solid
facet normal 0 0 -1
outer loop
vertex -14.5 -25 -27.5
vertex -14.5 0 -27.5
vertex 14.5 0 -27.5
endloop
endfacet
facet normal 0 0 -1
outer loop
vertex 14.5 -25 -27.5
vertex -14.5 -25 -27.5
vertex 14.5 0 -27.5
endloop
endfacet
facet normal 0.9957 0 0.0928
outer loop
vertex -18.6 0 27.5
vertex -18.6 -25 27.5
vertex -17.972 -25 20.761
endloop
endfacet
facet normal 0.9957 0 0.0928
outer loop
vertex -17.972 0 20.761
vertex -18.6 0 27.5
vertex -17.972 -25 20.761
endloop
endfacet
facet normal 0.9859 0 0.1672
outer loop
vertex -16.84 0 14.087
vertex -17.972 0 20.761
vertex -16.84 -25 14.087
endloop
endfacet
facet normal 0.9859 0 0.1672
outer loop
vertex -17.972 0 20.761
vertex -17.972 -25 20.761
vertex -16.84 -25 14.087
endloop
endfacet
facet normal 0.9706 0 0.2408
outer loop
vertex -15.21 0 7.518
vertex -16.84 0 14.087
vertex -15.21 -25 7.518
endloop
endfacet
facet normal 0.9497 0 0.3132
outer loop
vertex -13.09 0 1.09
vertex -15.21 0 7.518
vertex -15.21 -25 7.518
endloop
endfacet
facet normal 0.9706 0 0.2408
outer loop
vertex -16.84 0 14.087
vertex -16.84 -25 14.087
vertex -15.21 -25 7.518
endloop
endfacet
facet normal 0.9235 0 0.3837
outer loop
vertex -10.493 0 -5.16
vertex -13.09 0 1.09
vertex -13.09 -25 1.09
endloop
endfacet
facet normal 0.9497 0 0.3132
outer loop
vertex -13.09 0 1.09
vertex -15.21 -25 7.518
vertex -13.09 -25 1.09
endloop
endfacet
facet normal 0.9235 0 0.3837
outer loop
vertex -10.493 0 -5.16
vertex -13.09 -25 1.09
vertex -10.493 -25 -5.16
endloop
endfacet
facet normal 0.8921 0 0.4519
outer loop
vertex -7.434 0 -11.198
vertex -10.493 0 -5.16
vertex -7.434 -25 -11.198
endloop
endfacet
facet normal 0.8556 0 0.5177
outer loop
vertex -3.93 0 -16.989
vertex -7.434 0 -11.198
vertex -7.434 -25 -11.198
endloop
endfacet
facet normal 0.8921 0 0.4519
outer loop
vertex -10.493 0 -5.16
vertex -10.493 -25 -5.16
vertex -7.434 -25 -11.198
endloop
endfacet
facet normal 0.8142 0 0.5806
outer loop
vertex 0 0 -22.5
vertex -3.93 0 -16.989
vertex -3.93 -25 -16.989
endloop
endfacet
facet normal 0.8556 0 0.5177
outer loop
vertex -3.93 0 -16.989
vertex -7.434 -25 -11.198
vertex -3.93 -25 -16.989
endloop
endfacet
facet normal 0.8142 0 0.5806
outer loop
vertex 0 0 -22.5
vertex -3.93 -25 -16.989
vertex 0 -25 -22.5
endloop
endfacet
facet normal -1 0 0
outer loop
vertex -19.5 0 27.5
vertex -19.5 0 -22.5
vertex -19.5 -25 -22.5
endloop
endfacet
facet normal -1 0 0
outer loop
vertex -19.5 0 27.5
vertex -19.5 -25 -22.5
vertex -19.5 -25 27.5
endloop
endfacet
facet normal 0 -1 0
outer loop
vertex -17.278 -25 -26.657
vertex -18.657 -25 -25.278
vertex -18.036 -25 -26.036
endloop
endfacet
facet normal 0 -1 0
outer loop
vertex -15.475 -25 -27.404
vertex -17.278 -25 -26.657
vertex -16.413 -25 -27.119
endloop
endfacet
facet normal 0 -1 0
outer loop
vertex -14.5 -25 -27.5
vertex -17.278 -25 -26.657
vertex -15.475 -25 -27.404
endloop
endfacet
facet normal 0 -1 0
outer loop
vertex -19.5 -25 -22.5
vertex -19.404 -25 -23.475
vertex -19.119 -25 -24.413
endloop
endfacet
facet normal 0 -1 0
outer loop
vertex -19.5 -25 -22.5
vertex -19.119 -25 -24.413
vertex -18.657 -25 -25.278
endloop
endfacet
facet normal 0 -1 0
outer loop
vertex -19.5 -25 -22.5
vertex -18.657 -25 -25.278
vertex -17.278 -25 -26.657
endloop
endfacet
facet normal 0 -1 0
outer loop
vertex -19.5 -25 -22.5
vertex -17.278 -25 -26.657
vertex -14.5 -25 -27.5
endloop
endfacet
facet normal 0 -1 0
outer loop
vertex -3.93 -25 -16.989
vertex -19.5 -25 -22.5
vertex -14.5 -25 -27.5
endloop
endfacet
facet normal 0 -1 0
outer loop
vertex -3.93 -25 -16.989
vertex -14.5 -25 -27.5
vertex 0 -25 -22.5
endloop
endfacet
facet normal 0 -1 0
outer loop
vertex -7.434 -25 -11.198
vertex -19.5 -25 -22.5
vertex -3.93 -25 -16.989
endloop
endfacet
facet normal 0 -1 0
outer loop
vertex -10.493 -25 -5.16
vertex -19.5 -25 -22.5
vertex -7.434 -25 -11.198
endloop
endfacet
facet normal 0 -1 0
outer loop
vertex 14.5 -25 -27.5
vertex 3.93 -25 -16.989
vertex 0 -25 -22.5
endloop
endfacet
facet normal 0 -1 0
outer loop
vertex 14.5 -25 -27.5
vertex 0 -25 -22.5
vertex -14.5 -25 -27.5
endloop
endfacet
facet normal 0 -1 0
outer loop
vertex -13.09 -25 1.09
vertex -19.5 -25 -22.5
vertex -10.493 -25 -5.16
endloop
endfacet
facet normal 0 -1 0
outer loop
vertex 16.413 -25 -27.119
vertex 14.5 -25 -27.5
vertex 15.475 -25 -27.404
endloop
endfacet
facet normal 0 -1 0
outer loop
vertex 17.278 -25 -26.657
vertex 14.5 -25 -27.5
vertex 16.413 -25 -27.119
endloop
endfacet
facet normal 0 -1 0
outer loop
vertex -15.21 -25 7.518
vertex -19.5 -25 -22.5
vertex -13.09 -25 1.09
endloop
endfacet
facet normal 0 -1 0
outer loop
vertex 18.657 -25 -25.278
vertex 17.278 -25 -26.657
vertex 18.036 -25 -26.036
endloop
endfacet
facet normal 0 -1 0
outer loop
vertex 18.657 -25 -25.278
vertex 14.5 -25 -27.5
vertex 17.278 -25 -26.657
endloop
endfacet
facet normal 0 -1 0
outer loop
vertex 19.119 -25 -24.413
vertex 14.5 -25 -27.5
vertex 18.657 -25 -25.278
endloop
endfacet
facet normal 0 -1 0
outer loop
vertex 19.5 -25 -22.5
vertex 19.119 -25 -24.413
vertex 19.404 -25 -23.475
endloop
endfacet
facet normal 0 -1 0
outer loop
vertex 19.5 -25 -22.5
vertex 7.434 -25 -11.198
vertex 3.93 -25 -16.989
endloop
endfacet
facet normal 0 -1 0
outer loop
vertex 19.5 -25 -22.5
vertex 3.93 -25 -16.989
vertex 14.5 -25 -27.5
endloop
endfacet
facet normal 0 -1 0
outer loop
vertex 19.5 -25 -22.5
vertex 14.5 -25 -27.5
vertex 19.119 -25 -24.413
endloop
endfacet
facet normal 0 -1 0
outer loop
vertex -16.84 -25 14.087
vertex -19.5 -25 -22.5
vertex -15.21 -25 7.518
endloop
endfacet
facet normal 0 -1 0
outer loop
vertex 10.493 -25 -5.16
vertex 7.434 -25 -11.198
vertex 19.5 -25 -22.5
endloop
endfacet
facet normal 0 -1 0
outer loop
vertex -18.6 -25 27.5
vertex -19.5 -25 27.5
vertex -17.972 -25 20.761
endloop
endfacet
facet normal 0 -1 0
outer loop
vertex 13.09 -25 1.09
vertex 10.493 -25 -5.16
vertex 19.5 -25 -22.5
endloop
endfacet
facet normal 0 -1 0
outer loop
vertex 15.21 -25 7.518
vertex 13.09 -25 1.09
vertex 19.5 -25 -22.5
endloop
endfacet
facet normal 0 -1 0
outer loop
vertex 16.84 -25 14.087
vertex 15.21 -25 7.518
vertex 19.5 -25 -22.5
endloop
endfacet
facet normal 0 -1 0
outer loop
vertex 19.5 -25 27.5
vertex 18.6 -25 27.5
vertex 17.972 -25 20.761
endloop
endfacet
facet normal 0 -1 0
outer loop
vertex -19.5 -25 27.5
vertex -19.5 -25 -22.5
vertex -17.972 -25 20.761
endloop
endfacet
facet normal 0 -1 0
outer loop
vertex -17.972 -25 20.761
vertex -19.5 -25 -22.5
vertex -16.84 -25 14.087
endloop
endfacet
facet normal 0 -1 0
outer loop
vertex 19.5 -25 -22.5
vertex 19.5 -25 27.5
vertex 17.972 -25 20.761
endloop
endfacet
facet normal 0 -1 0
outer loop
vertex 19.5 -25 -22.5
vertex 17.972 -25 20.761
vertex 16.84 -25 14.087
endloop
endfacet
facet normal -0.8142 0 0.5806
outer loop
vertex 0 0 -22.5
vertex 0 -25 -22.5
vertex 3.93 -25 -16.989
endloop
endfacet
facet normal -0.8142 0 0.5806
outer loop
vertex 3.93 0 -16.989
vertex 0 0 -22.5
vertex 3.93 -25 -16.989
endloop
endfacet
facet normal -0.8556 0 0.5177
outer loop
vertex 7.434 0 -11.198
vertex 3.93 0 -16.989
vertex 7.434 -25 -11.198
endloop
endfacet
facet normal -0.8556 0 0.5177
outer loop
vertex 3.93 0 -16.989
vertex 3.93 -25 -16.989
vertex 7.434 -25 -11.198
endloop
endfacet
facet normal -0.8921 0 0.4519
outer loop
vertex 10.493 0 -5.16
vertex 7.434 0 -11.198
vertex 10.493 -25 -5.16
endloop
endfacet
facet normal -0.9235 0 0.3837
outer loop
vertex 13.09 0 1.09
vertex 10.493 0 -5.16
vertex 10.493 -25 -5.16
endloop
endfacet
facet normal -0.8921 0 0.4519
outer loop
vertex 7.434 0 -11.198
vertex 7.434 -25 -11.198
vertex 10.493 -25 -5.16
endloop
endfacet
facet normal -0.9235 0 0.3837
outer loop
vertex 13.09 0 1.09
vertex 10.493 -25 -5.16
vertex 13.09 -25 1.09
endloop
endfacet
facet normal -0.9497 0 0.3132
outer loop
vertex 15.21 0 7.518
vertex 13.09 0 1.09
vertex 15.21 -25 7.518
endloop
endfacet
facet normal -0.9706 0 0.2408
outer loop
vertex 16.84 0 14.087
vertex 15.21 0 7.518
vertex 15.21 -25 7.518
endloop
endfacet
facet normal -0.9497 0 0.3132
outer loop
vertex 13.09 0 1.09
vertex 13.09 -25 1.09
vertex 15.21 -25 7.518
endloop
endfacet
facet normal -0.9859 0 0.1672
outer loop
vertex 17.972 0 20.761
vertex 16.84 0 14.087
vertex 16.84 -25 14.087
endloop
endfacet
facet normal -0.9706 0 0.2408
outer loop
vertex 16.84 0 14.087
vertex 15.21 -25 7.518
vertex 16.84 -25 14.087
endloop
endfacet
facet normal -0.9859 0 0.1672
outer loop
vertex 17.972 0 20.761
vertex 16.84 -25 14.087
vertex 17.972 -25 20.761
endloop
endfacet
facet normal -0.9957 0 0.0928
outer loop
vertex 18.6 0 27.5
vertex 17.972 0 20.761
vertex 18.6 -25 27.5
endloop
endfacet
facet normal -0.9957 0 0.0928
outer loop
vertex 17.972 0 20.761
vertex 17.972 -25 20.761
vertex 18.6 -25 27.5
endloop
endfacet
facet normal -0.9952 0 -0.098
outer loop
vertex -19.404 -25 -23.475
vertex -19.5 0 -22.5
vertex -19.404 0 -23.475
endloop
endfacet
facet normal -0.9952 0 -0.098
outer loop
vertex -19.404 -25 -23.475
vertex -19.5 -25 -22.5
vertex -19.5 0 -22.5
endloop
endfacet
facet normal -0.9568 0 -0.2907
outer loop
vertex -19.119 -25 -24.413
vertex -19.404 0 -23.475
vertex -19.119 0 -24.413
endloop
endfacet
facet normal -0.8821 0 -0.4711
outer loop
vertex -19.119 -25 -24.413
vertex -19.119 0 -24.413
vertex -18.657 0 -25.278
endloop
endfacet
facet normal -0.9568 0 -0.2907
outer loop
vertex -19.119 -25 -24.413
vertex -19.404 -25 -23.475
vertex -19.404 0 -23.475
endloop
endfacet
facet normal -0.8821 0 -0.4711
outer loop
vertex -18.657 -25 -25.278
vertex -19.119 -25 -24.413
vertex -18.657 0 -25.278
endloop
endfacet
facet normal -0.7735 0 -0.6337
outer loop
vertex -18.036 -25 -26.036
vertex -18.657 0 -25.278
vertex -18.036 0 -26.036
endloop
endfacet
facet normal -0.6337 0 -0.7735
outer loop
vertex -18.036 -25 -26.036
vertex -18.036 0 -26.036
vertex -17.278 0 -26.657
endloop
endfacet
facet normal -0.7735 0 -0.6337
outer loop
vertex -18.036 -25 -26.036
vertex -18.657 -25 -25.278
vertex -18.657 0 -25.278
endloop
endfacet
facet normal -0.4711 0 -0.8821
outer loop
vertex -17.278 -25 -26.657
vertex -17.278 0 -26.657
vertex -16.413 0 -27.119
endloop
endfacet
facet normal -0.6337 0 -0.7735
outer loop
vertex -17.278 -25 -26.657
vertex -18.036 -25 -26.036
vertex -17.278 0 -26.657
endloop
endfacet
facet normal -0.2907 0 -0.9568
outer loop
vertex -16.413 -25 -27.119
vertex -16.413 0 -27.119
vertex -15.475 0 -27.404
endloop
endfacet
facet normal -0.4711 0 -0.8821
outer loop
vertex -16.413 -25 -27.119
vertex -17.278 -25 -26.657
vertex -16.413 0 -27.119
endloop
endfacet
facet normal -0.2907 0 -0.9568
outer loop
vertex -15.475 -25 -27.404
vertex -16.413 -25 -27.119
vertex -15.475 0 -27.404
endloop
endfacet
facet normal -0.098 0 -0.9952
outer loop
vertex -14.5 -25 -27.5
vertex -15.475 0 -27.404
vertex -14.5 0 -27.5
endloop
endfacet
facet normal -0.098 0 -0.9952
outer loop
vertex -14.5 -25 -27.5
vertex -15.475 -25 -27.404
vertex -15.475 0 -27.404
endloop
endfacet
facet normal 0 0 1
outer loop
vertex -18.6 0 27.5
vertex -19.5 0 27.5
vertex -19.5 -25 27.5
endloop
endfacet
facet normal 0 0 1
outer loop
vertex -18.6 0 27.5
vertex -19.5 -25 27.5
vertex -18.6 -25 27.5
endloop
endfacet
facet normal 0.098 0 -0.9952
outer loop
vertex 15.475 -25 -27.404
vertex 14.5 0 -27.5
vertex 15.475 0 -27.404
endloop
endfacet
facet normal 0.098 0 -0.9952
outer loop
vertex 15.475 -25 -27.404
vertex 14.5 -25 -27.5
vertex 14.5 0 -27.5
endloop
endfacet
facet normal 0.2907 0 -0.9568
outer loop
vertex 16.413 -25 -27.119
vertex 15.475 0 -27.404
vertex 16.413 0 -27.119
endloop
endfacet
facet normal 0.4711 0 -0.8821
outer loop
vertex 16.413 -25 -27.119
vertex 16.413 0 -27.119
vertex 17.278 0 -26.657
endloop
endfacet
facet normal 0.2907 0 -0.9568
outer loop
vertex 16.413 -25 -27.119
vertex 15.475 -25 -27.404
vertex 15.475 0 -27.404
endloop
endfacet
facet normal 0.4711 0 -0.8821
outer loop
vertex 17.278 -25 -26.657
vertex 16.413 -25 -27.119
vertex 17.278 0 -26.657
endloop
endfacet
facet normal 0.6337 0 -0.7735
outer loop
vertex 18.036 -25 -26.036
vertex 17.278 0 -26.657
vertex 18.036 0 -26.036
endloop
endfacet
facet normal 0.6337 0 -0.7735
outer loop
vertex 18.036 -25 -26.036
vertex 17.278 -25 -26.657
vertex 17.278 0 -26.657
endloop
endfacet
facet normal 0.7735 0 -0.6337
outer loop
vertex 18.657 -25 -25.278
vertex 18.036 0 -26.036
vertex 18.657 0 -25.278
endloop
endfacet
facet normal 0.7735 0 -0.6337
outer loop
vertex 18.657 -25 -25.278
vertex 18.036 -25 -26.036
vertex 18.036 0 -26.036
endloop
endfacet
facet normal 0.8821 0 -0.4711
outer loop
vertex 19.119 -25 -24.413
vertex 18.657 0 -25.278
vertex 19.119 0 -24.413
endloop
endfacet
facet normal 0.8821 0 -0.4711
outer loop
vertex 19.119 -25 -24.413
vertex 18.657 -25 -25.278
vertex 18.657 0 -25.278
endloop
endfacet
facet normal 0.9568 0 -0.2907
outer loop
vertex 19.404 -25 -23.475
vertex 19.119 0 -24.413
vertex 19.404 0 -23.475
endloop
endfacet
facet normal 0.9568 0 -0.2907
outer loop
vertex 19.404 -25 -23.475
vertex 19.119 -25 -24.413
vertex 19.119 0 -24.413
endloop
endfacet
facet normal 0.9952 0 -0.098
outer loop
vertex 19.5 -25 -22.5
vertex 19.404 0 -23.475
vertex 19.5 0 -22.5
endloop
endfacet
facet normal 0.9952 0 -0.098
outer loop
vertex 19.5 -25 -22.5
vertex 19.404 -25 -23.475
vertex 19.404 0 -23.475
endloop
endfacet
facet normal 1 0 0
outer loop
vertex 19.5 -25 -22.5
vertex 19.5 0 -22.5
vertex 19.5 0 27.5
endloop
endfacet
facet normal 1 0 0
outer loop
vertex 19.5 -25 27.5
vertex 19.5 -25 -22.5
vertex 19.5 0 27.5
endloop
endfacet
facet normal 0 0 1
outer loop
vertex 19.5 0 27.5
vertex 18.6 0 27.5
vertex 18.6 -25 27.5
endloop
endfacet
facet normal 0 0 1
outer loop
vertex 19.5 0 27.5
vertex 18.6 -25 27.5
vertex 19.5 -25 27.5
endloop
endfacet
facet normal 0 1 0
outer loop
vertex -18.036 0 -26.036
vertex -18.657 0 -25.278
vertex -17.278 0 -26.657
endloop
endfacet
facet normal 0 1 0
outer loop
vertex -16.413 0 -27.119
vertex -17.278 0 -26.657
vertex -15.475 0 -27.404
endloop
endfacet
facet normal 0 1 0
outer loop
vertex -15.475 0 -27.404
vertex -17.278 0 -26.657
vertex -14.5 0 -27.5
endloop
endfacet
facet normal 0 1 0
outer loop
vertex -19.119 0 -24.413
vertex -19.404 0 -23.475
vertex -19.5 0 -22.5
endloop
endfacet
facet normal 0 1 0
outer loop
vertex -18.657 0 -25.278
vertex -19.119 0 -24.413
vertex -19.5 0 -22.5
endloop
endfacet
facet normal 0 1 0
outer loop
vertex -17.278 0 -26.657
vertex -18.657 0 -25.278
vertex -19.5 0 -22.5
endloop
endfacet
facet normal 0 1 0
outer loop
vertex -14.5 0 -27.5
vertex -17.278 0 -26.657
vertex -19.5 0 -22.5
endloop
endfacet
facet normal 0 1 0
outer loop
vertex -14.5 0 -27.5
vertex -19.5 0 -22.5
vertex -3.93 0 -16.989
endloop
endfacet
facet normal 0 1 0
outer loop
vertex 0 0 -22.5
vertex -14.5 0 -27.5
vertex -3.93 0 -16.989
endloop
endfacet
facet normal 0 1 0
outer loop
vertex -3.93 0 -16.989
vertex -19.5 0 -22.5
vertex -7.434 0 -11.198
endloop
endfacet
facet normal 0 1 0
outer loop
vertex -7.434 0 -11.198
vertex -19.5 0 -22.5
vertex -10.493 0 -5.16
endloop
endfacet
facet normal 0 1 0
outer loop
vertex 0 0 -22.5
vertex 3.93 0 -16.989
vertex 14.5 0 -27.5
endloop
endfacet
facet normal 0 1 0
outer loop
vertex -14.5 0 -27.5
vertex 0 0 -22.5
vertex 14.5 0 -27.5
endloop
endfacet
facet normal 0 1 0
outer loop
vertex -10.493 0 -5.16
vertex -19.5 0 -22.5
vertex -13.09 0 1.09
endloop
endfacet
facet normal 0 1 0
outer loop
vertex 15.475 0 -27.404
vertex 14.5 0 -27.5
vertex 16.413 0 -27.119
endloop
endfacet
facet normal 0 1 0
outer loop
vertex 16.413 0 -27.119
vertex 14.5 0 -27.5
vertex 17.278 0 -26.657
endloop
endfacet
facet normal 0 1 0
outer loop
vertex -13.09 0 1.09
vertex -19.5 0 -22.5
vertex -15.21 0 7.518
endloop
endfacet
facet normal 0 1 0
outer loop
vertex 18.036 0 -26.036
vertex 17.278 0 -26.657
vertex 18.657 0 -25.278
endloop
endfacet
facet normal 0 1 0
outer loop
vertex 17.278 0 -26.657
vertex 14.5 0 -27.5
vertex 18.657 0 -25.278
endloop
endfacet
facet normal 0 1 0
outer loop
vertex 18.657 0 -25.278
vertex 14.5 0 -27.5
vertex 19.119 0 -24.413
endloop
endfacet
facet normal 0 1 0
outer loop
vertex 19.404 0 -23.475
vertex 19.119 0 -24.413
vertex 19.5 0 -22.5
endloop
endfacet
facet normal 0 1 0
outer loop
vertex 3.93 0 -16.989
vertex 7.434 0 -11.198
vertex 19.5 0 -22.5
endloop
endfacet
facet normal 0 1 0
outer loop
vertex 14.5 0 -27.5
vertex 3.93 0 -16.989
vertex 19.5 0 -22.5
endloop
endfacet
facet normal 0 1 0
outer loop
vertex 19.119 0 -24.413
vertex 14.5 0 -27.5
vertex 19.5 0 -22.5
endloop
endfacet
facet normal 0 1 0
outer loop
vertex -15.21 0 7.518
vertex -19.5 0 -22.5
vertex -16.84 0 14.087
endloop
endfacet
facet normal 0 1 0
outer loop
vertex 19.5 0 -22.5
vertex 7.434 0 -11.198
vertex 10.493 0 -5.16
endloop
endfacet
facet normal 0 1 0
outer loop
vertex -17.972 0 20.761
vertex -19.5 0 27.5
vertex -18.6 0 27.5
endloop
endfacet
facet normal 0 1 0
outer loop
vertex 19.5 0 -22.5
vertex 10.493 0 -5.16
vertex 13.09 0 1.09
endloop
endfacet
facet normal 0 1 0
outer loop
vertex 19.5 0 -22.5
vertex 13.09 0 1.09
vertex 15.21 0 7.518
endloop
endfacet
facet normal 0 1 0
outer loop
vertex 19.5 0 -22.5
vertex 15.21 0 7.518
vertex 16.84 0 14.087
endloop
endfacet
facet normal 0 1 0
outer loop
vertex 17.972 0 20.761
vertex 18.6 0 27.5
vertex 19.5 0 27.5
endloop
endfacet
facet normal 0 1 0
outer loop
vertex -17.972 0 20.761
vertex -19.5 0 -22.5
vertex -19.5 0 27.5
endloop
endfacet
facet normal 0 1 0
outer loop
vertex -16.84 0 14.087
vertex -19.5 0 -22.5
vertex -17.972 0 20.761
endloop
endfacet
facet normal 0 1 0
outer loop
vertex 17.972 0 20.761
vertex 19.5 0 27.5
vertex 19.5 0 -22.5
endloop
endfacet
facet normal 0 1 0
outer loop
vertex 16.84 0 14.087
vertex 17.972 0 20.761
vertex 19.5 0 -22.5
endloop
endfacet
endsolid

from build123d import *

# Parameters (mm, degrees)
F0_W     = 39
F0_H     = 55
F1_DEPTH = 25
F3_DEPTH = 25
F4_R     = 5


with BuildPart() as f1:
    # F0 (on Front) → F1 (new body)
    with BuildSketch(Plane.XZ):
        Rectangle(F0_W, F0_H)
    extrude(amount=F1_DEPTH)

    # F2 (on face) → F3 (cut)
    with BuildSketch(Plane.XZ.offset(25)):
        with BuildLine():
            Line((18.6, 27.5), (-18.6, 27.5))
            ThreePointArc((-18.6, 27.5), (-13.089826, 1.090185), (0, -22.5))
            ThreePointArc((0, -22.5), (13.089826, 1.090185), (18.6, 27.5))
        make_face()
    extrude(amount=-F3_DEPTH, mode=Mode.SUBTRACT)

    # F4
    f4_edges = [f1.edges().sort_by_distance(p)[0] for p in [
        (-19.5, -12.5, -27.5),
        (19.5, -12.5, -27.5),
    ]]
    fillet(f4_edges, radius=F4_R)


solid = f1.part
